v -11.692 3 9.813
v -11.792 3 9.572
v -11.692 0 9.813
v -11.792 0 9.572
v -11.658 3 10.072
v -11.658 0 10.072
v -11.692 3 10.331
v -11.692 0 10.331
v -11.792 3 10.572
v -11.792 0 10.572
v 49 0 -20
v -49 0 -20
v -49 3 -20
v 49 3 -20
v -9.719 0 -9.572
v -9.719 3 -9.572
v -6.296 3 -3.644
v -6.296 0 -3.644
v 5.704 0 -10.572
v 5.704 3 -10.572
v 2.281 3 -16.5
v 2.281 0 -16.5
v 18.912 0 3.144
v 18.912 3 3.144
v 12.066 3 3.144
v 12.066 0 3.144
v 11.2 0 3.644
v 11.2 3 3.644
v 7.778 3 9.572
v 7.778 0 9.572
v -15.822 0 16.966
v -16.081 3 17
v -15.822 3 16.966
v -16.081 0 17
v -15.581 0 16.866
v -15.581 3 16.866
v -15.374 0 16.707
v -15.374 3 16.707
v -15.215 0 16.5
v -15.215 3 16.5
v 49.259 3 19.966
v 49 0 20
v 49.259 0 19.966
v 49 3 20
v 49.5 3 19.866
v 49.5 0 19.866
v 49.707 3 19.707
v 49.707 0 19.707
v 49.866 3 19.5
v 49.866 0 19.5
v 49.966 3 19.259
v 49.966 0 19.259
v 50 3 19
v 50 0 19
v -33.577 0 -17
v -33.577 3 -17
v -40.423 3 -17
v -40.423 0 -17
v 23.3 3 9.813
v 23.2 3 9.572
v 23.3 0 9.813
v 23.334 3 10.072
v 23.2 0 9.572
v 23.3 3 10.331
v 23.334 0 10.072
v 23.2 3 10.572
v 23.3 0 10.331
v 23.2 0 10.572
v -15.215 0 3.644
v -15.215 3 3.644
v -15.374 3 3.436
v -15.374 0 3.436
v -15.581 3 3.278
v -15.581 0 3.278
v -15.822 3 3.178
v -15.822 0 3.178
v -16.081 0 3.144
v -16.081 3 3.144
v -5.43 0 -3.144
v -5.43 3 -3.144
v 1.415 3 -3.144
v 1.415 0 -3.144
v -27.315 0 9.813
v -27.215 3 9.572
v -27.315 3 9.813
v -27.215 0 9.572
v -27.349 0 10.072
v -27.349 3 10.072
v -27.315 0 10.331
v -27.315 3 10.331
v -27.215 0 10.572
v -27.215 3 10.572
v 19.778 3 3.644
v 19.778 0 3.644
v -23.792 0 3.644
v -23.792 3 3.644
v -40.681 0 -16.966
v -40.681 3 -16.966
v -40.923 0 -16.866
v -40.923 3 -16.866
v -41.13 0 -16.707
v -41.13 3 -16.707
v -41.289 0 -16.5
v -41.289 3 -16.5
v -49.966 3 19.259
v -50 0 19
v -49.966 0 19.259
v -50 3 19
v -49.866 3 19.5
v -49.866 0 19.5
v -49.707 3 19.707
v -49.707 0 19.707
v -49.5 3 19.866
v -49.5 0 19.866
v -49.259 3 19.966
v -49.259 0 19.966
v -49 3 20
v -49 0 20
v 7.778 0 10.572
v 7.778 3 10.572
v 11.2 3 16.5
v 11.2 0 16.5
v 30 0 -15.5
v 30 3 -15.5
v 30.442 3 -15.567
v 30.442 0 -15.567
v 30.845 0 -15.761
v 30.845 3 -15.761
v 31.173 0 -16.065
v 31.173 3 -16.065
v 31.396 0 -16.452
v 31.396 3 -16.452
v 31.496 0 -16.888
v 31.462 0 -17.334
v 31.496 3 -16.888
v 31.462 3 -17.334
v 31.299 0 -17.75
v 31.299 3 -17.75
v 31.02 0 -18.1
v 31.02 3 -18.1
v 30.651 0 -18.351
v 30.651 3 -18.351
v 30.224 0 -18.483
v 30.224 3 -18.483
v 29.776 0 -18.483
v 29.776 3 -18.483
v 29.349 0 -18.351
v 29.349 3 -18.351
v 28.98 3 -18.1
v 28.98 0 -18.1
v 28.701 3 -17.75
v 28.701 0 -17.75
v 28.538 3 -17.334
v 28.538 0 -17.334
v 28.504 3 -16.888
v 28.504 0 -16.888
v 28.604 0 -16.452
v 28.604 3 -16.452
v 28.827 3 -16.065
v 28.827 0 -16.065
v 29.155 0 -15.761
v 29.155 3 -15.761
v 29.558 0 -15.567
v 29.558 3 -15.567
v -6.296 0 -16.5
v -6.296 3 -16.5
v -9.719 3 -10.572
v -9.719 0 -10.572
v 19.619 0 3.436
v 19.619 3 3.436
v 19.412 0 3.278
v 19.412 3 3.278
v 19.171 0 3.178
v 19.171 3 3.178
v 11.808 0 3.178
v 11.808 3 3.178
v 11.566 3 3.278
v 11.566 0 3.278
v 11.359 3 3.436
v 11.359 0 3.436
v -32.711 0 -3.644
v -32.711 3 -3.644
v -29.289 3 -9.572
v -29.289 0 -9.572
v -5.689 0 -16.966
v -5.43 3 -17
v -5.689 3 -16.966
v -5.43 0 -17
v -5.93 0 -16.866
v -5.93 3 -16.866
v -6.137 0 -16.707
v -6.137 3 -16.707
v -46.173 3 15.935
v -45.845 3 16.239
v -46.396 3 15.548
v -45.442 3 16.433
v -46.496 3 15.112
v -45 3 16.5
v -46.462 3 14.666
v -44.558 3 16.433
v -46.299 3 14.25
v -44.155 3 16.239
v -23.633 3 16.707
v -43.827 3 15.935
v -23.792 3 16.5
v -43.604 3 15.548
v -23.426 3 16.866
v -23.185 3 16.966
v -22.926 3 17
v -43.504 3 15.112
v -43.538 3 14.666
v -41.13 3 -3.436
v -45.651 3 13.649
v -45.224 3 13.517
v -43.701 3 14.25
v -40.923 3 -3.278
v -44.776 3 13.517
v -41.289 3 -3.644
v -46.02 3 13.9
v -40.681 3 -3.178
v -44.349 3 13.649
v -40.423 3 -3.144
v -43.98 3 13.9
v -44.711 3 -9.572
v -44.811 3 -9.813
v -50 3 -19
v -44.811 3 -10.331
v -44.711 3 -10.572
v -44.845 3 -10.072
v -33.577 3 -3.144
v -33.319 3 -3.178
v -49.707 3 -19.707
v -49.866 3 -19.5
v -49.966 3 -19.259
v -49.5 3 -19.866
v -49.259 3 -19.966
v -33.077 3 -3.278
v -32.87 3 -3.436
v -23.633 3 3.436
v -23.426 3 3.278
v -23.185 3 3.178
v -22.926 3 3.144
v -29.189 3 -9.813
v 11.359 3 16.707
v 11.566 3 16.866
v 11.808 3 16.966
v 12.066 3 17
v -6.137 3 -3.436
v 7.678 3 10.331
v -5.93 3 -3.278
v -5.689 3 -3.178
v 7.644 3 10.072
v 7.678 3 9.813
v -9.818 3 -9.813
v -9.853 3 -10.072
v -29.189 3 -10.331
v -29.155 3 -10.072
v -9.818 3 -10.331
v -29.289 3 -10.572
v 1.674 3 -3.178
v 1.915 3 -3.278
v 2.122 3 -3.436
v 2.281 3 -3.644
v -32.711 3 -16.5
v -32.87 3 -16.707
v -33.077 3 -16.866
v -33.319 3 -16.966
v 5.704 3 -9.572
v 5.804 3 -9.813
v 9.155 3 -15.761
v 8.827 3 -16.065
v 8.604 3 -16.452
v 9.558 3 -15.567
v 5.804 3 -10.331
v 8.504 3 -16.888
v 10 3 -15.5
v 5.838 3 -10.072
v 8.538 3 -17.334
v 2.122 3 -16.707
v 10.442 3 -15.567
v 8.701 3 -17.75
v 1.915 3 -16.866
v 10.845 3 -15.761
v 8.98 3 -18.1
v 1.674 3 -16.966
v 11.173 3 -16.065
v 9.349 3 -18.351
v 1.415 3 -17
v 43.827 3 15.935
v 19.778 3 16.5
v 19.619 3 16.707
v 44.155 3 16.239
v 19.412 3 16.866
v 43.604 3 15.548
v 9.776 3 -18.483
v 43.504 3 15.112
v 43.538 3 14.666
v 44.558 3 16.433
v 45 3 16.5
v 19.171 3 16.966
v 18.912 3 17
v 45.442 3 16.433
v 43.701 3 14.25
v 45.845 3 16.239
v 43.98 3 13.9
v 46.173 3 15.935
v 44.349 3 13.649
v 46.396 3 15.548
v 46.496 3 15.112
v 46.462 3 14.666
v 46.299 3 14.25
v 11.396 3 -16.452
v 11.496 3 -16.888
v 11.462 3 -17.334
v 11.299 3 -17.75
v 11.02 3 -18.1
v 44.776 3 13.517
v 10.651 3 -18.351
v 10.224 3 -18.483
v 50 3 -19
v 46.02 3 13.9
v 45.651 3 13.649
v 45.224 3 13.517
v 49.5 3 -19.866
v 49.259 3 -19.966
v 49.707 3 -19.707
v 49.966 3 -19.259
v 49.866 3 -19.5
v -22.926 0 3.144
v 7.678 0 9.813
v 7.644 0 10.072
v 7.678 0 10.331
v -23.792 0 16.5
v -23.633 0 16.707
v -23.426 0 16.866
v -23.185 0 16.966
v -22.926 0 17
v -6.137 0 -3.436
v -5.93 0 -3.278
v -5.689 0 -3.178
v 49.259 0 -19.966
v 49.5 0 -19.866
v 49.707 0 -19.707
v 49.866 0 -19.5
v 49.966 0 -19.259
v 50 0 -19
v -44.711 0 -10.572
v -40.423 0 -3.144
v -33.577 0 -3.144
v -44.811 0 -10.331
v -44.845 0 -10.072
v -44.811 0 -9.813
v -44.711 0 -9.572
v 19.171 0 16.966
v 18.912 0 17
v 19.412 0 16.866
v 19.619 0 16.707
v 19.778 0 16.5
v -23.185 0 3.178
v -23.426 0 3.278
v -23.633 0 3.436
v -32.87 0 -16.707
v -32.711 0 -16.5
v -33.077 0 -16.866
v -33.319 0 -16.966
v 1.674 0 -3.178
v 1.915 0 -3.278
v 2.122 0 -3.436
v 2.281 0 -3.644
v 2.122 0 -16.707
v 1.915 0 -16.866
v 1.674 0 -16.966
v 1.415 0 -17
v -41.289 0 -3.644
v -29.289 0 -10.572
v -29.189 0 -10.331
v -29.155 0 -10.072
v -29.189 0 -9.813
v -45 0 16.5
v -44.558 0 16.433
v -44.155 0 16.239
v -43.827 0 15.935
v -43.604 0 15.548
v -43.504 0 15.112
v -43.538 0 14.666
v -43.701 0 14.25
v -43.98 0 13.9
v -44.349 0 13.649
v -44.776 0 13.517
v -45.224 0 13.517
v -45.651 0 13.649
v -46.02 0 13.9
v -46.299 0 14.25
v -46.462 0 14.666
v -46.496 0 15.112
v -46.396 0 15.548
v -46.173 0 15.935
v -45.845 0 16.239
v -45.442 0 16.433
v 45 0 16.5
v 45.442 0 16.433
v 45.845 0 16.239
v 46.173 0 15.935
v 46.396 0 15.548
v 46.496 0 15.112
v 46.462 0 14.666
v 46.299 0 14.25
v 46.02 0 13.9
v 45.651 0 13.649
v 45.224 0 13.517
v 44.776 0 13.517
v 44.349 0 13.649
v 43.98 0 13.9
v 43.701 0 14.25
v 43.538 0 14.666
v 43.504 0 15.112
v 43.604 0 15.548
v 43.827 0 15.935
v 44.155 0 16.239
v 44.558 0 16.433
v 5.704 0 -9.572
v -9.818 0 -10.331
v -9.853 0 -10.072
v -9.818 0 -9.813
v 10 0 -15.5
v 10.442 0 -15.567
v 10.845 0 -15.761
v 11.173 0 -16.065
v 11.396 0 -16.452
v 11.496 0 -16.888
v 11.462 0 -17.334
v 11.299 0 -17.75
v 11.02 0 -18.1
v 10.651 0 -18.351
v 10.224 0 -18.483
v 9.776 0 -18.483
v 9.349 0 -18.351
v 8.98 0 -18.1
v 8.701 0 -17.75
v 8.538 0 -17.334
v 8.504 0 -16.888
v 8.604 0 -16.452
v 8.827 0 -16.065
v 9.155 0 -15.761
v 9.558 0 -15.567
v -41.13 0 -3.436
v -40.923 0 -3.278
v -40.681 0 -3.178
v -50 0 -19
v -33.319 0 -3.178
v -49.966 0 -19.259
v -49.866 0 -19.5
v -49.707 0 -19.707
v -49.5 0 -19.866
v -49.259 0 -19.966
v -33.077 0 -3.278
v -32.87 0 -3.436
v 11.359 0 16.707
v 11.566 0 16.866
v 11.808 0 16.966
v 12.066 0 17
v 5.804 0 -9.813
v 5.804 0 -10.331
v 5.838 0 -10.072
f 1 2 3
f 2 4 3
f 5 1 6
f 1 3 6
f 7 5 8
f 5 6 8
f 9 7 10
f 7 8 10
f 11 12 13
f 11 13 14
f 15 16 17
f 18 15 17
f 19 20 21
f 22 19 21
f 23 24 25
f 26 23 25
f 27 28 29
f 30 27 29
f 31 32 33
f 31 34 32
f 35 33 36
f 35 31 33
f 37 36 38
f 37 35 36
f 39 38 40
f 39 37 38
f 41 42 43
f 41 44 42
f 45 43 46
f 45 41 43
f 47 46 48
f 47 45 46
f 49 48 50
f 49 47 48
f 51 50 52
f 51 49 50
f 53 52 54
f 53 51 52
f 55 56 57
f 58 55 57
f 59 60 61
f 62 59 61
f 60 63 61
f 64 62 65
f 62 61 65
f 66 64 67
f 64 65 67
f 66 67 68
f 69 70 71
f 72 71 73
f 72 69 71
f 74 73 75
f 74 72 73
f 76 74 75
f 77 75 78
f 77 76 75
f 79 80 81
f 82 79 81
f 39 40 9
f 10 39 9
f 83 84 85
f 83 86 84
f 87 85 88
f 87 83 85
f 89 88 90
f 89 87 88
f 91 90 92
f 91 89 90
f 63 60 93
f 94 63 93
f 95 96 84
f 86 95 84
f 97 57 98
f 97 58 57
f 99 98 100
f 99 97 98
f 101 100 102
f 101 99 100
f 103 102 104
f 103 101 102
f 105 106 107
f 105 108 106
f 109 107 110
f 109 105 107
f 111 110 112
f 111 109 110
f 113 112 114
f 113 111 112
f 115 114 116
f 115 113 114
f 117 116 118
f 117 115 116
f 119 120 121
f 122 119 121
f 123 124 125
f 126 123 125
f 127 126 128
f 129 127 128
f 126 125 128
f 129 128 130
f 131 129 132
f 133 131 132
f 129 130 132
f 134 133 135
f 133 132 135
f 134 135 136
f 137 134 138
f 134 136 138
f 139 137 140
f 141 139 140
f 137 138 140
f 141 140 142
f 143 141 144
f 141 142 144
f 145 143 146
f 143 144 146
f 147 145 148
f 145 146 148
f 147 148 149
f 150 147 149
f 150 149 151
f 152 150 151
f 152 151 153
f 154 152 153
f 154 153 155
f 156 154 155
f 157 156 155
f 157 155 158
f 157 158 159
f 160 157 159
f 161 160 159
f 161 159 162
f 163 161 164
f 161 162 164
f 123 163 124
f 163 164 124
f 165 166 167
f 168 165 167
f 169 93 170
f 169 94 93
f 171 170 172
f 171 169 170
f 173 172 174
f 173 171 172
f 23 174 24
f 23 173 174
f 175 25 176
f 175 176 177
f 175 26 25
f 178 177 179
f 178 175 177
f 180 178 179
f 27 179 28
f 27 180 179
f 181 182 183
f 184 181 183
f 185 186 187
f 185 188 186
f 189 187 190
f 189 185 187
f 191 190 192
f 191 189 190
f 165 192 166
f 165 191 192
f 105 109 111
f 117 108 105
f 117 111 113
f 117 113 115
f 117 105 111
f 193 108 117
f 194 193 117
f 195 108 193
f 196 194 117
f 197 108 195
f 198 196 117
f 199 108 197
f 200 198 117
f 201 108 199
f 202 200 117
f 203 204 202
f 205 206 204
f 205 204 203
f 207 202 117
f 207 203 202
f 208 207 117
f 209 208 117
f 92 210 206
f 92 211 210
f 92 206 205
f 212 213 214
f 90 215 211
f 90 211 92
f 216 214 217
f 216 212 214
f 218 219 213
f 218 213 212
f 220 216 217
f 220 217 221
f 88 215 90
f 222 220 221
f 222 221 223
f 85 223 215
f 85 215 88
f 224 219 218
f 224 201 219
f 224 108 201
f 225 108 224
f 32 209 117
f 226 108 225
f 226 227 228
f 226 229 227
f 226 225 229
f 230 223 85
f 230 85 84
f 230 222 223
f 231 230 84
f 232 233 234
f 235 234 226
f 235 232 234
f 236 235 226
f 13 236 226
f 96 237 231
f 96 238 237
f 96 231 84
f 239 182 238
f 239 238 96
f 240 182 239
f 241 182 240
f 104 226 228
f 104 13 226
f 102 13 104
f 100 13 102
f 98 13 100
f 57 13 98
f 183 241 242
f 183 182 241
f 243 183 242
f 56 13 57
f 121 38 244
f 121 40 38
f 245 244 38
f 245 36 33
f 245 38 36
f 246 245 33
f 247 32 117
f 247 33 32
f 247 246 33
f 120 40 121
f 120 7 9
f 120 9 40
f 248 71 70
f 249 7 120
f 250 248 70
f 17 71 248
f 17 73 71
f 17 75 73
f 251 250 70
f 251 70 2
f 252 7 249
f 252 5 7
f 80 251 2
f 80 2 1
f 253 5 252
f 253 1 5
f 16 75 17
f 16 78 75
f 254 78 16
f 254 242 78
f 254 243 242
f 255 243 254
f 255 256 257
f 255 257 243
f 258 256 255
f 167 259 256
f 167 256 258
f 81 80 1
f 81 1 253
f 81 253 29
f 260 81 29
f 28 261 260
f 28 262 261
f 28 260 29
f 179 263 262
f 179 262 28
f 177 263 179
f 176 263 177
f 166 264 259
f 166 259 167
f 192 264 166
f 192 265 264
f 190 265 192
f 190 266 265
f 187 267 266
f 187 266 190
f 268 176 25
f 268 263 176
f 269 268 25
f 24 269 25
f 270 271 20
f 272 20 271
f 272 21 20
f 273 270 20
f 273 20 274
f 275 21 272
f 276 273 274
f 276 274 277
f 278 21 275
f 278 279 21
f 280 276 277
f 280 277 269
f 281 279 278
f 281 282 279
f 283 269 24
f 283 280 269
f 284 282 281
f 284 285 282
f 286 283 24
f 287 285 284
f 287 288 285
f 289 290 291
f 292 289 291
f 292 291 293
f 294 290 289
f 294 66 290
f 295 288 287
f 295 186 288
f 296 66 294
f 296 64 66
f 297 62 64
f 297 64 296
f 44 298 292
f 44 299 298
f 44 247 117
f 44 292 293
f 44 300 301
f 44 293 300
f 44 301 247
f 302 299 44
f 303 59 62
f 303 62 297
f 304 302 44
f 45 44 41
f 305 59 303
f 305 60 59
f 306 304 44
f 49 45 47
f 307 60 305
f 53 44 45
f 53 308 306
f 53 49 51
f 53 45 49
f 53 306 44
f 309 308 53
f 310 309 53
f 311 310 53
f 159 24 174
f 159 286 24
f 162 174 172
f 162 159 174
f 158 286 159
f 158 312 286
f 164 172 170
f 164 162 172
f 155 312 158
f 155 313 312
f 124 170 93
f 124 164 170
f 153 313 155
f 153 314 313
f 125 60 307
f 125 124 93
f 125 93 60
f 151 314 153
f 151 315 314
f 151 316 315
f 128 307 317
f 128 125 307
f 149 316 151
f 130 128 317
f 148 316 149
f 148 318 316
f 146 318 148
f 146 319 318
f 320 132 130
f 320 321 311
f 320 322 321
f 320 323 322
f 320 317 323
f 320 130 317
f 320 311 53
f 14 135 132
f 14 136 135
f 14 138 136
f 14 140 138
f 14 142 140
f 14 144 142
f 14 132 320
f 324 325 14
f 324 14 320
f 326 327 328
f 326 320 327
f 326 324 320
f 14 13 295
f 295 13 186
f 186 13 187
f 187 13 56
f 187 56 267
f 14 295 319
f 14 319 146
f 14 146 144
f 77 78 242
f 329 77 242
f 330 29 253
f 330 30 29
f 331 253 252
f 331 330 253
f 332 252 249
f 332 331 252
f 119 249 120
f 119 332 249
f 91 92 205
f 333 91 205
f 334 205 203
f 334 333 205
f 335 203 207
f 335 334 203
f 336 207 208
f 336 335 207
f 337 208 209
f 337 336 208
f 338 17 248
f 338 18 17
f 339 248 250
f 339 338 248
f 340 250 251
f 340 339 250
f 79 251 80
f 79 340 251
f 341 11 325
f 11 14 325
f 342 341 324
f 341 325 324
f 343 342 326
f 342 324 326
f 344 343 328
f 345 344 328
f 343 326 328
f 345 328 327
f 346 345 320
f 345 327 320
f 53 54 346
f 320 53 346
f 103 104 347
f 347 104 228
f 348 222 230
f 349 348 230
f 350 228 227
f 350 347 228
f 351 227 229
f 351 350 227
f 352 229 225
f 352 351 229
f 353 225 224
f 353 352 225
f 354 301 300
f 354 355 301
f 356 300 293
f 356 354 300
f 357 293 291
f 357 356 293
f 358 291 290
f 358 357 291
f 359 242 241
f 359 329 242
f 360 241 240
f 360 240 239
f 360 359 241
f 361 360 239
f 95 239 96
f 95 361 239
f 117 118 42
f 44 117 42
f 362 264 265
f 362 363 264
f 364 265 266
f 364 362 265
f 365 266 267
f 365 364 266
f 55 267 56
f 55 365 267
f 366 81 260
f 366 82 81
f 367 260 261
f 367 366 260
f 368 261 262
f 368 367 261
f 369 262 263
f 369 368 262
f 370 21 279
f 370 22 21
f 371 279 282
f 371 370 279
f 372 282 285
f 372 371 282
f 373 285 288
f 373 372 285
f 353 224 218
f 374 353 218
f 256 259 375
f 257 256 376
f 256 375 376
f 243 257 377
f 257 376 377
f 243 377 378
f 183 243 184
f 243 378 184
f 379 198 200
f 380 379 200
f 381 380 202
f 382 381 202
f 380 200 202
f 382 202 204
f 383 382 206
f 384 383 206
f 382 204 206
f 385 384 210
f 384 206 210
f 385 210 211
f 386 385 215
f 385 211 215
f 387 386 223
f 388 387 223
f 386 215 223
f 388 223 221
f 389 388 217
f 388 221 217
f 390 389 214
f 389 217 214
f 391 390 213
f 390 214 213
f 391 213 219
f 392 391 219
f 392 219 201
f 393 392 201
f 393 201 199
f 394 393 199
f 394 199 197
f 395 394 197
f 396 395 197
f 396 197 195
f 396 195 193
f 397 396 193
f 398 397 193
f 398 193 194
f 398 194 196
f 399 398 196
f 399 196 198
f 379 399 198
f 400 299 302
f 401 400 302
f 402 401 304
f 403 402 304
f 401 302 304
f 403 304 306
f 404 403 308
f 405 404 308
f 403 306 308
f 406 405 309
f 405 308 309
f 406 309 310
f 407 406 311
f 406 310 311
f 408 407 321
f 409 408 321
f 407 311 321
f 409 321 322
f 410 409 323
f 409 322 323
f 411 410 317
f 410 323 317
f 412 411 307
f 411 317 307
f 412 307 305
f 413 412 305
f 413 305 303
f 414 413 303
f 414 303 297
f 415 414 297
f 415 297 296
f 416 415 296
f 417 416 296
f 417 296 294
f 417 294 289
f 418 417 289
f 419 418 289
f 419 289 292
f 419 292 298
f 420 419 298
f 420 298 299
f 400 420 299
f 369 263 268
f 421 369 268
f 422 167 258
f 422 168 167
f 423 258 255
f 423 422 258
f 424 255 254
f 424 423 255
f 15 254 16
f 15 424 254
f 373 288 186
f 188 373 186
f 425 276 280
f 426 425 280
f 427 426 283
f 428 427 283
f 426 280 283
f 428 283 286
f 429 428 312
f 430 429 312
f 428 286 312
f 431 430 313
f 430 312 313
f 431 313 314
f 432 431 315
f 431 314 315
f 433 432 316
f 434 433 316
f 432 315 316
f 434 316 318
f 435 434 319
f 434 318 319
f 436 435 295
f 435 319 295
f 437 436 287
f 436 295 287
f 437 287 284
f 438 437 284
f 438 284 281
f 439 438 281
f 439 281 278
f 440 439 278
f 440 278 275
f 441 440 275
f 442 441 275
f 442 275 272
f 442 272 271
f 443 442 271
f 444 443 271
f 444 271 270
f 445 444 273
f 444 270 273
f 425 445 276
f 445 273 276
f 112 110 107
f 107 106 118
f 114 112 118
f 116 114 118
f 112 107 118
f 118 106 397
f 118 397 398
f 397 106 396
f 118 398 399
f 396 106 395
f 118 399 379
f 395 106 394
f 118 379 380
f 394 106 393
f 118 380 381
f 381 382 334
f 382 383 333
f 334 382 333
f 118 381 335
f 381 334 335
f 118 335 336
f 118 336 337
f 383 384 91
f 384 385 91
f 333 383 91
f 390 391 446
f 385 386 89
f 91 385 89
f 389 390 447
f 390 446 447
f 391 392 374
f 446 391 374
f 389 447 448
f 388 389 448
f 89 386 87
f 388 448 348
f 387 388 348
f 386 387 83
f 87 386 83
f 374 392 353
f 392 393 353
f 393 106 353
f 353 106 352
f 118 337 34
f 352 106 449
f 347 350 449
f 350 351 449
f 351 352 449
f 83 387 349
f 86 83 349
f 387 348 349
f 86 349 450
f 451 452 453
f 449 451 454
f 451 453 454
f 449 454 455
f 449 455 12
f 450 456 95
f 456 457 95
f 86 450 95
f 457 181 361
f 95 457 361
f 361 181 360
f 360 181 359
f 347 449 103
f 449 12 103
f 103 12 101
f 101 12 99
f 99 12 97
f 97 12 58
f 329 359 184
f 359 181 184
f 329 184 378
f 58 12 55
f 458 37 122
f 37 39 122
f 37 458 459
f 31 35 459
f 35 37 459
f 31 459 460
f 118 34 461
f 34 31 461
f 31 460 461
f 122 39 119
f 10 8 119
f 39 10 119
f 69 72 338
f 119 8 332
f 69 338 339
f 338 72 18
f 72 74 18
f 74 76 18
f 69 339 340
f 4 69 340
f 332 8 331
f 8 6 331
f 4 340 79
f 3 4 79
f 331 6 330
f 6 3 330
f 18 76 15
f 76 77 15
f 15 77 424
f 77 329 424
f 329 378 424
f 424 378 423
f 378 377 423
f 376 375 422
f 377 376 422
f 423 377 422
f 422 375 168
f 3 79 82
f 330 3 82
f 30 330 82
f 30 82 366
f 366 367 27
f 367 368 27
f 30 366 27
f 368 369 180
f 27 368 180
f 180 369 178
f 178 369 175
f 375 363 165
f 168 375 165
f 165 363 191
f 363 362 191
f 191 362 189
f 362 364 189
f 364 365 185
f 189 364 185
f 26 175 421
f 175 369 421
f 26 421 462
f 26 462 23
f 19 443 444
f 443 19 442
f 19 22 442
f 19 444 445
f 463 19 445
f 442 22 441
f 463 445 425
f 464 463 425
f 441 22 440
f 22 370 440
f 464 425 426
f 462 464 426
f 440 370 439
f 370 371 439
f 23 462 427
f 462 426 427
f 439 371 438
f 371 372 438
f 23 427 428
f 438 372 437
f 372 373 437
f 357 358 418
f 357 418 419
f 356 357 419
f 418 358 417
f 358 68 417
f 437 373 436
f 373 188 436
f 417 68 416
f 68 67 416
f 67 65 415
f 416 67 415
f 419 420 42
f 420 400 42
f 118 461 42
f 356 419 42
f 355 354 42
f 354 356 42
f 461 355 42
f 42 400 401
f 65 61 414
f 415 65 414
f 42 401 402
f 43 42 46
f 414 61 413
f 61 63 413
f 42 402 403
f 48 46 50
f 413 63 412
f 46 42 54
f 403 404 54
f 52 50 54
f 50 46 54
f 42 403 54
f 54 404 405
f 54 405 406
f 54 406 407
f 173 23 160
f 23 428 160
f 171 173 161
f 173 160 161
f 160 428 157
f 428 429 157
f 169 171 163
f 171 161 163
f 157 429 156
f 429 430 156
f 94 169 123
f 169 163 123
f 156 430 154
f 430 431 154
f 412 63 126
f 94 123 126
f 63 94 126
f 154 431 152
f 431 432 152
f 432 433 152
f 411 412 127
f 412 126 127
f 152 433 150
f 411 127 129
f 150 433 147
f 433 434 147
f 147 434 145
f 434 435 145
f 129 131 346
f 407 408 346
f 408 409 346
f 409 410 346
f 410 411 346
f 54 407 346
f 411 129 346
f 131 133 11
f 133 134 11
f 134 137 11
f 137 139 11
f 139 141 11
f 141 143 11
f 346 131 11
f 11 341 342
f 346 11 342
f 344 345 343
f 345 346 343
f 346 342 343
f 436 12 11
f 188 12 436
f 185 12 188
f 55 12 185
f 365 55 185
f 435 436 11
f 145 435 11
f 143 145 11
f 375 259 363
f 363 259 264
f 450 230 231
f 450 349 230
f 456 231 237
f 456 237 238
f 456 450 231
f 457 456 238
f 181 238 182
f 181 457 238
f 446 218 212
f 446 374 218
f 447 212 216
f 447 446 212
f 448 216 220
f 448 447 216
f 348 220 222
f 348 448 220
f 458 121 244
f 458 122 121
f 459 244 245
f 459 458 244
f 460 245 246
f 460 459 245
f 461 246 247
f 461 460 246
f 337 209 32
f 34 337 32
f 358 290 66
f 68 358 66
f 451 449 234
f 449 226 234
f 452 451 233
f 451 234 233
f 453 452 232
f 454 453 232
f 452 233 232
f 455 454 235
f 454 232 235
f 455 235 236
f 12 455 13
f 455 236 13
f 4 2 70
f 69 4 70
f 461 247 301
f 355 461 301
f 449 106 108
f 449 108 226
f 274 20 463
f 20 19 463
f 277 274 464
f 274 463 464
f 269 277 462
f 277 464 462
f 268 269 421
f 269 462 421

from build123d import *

# Parameters (mm, degrees)
SKETCH_1_W          = 100
SKETCH_1_H          = 40
EXTRUDE_1_DEPTH     = 3
SKETCH_2_R          = 1.5
CUT_EXTRUDE_1_DEPTH = 3
FILLET_1_R          = 1
CUT_EXTRUDE_2_DEPTH = 10
FILLET_2_R          = 1
SKETCH_4_R          = 1.5
CUT_EXTRUDE_3_DEPTH = 10


with BuildPart() as part:
    # 草图1 → 凸台-拉伸1 (new body)
    with BuildSketch(Plane(origin=(0, 0, 0), x_dir=(1, 0, 0), z_dir=(0, 1, 0))):
        Rectangle(SKETCH_1_W, SKETCH_1_H)
    extrude(amount=EXTRUDE_1_DEPTH)

    # 草图2 → 切除-拉伸1 (cut)
    with BuildSketch(Plane(origin=(0, 3, 0), x_dir=(1, 0, 0), z_dir=(0, 1, 0))):
        with Locations(Location((10, 17, 0), (0, 0, 270))):
            Circle(SKETCH_2_R)
        with Locations(Location((30, 17, 0), (0, 0, 270))):
            Circle(SKETCH_2_R)
    extrude(amount=-CUT_EXTRUDE_1_DEPTH, mode=Mode.SUBTRACT)

    # 圆角1
    fillet_1_edges = [part.edges().sort_by_distance(p)[0] for p in [
        (50, 1.5, 20),
        (-50, 1.5, 20),
        (-50, 1.5, -20),
        (50, 1.5, -20),
    ]]
    fillet(fillet_1_edges, radius=FILLET_1_R)

    # 草图3 → 切除-拉伸2 (cut)
    with BuildSketch(Plane(origin=(0, 3, 0), x_dir=(1, 0, 0), z_dir=(0, 1, 0))):
        Polygon((-29, 10.07179677), (-33, 17), (-41, 17), (-45, 10.07179677), (-41, 3.143593539), (-33, 3.143593539), align=None)
        Polygon((-11.503632276, -10.07179677), (-15.503632276, -3.143593539), (-23.503632276, -3.143593539), (-27.503632276, -10.07179677), (-23.503632276, -17), (-15.503632276, -17), align=None)
        Polygon((5.992735447, 10.07179677), (1.992735447, 17), (-6.007264553, 17), (-10.007264553, 10.07179677), (-6.007264553, 3.143593539), (1.992735447, 3.143593539), align=None)
        Polygon((23.489103171, -10.07179677), (19.489103171, -3.143593539), (11.489103171, -3.143593539), (7.489103171, -10.07179677), (11.489103171, -17), (19.489103171, -17), align=None)
    extrude(amount=-CUT_EXTRUDE_2_DEPTH, mode=Mode.SUBTRACT)

    # 圆角2
    fillet_2_edges = [part.edges().sort_by_distance(p)[0] for p in [
        (-11.503632276, 1.5, 10.07179677),
        (-15.503632276, 1.5, 17),
        (-23.503632276, 1.5, 17),
        (-27.503632276, 1.5, 10.07179677),
        (-23.503632276, 1.5, 3.143593539),
        (-15.503632276, 1.5, 3.143593539),
        (23.489103171, 1.5, 10.07179677),
        (19.489103171, 1.5, 17),
        (11.489103171, 1.5, 17),
        (7.489103171, 1.5, 10.07179677),
        (11.489103171, 1.5, 3.143593539),
        (19.489103171, 1.5, 3.143593539),
        (-29, 1.5, -10.07179677),
        (-33, 1.5, -3.143593539),
        (-41, 1.5, -3.143593539),
        (-45, 1.5, -10.07179677),
        (-41, 1.5, -17),
        (-33, 1.5, -17),
        (5.992735447, 1.5, -10.07179677),
        (1.992735447, 1.5, -3.143593539),
        (-6.007264553, 1.5, -3.143593539),
        (-10.007264553, 1.5, -10.07179677),
        (-6.007264553, 1.5, -17),
        (1.992735447, 1.5, -17),
    ]]
    fillet(fillet_2_edges, radius=FILLET_2_R)

    # 草图4 → 切除-拉伸3 (cut)
    with BuildSketch(Plane(origin=(0, 3, 0), x_dir=(1, 0, 0), z_dir=(0, 1, 0))):
        with Locations(Location((-45, -15, 0), (0, 0, 270))):
            Circle(SKETCH_4_R)
        with Locations(Location((45, -15, 0), (0, 0, 270))):
            Circle(SKETCH_4_R)
    extrude(amount=-CUT_EXTRUDE_3_DEPTH, mode=Mode.SUBTRACT)


solid = part.part
